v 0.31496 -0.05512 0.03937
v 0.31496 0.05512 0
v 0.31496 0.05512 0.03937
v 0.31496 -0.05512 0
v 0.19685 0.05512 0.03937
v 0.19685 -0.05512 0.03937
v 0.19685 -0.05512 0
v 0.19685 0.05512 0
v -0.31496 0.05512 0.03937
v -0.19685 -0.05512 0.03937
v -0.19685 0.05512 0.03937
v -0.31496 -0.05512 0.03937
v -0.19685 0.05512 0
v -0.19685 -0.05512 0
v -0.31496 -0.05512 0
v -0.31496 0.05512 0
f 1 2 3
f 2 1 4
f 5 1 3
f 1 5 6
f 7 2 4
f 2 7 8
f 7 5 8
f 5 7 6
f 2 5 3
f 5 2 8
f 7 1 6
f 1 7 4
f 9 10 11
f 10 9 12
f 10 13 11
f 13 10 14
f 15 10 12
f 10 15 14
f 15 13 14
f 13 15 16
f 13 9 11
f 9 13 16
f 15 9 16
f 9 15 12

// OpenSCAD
// file: defines.scad
L = 3.0;  // Длина
W = 3.0;  // Ширина
H = 1.0;  // Высота
Hf = 0.04;  // Возвышение над платой (высота выводов)
e = 0.5;    // Шаг выводов

pin_fragments = 16;

A = 0.60;
E = 1.60;
E1 = 1.20;
D = 0.80;
b = 0.28; // 0.25 .. 0.35
c = 0.10; // 0.07 .. 0.20
L = 0.20;
L1 = 0.1; // 0.05 .. 0.20


scale = 1/2.54;
// main file
include <defines.scad>

/*module Pin(x, y, z, r) {

    translate([-0.39,0,0.15]) cube(size = [0.015, p_h, 0.1],center=true); // На боковине
}*/

scale(scale) color("Silver") {
  translate([E1/2 - L1, -b/2, 0])
    cube([(E - E1) / 2 + L1, b, c]);
  mirror([1,0,0])
  translate([E1/2 - L1, -b/2, 0])
    cube([(E - E1) / 2 + L1, b, c]);
}
